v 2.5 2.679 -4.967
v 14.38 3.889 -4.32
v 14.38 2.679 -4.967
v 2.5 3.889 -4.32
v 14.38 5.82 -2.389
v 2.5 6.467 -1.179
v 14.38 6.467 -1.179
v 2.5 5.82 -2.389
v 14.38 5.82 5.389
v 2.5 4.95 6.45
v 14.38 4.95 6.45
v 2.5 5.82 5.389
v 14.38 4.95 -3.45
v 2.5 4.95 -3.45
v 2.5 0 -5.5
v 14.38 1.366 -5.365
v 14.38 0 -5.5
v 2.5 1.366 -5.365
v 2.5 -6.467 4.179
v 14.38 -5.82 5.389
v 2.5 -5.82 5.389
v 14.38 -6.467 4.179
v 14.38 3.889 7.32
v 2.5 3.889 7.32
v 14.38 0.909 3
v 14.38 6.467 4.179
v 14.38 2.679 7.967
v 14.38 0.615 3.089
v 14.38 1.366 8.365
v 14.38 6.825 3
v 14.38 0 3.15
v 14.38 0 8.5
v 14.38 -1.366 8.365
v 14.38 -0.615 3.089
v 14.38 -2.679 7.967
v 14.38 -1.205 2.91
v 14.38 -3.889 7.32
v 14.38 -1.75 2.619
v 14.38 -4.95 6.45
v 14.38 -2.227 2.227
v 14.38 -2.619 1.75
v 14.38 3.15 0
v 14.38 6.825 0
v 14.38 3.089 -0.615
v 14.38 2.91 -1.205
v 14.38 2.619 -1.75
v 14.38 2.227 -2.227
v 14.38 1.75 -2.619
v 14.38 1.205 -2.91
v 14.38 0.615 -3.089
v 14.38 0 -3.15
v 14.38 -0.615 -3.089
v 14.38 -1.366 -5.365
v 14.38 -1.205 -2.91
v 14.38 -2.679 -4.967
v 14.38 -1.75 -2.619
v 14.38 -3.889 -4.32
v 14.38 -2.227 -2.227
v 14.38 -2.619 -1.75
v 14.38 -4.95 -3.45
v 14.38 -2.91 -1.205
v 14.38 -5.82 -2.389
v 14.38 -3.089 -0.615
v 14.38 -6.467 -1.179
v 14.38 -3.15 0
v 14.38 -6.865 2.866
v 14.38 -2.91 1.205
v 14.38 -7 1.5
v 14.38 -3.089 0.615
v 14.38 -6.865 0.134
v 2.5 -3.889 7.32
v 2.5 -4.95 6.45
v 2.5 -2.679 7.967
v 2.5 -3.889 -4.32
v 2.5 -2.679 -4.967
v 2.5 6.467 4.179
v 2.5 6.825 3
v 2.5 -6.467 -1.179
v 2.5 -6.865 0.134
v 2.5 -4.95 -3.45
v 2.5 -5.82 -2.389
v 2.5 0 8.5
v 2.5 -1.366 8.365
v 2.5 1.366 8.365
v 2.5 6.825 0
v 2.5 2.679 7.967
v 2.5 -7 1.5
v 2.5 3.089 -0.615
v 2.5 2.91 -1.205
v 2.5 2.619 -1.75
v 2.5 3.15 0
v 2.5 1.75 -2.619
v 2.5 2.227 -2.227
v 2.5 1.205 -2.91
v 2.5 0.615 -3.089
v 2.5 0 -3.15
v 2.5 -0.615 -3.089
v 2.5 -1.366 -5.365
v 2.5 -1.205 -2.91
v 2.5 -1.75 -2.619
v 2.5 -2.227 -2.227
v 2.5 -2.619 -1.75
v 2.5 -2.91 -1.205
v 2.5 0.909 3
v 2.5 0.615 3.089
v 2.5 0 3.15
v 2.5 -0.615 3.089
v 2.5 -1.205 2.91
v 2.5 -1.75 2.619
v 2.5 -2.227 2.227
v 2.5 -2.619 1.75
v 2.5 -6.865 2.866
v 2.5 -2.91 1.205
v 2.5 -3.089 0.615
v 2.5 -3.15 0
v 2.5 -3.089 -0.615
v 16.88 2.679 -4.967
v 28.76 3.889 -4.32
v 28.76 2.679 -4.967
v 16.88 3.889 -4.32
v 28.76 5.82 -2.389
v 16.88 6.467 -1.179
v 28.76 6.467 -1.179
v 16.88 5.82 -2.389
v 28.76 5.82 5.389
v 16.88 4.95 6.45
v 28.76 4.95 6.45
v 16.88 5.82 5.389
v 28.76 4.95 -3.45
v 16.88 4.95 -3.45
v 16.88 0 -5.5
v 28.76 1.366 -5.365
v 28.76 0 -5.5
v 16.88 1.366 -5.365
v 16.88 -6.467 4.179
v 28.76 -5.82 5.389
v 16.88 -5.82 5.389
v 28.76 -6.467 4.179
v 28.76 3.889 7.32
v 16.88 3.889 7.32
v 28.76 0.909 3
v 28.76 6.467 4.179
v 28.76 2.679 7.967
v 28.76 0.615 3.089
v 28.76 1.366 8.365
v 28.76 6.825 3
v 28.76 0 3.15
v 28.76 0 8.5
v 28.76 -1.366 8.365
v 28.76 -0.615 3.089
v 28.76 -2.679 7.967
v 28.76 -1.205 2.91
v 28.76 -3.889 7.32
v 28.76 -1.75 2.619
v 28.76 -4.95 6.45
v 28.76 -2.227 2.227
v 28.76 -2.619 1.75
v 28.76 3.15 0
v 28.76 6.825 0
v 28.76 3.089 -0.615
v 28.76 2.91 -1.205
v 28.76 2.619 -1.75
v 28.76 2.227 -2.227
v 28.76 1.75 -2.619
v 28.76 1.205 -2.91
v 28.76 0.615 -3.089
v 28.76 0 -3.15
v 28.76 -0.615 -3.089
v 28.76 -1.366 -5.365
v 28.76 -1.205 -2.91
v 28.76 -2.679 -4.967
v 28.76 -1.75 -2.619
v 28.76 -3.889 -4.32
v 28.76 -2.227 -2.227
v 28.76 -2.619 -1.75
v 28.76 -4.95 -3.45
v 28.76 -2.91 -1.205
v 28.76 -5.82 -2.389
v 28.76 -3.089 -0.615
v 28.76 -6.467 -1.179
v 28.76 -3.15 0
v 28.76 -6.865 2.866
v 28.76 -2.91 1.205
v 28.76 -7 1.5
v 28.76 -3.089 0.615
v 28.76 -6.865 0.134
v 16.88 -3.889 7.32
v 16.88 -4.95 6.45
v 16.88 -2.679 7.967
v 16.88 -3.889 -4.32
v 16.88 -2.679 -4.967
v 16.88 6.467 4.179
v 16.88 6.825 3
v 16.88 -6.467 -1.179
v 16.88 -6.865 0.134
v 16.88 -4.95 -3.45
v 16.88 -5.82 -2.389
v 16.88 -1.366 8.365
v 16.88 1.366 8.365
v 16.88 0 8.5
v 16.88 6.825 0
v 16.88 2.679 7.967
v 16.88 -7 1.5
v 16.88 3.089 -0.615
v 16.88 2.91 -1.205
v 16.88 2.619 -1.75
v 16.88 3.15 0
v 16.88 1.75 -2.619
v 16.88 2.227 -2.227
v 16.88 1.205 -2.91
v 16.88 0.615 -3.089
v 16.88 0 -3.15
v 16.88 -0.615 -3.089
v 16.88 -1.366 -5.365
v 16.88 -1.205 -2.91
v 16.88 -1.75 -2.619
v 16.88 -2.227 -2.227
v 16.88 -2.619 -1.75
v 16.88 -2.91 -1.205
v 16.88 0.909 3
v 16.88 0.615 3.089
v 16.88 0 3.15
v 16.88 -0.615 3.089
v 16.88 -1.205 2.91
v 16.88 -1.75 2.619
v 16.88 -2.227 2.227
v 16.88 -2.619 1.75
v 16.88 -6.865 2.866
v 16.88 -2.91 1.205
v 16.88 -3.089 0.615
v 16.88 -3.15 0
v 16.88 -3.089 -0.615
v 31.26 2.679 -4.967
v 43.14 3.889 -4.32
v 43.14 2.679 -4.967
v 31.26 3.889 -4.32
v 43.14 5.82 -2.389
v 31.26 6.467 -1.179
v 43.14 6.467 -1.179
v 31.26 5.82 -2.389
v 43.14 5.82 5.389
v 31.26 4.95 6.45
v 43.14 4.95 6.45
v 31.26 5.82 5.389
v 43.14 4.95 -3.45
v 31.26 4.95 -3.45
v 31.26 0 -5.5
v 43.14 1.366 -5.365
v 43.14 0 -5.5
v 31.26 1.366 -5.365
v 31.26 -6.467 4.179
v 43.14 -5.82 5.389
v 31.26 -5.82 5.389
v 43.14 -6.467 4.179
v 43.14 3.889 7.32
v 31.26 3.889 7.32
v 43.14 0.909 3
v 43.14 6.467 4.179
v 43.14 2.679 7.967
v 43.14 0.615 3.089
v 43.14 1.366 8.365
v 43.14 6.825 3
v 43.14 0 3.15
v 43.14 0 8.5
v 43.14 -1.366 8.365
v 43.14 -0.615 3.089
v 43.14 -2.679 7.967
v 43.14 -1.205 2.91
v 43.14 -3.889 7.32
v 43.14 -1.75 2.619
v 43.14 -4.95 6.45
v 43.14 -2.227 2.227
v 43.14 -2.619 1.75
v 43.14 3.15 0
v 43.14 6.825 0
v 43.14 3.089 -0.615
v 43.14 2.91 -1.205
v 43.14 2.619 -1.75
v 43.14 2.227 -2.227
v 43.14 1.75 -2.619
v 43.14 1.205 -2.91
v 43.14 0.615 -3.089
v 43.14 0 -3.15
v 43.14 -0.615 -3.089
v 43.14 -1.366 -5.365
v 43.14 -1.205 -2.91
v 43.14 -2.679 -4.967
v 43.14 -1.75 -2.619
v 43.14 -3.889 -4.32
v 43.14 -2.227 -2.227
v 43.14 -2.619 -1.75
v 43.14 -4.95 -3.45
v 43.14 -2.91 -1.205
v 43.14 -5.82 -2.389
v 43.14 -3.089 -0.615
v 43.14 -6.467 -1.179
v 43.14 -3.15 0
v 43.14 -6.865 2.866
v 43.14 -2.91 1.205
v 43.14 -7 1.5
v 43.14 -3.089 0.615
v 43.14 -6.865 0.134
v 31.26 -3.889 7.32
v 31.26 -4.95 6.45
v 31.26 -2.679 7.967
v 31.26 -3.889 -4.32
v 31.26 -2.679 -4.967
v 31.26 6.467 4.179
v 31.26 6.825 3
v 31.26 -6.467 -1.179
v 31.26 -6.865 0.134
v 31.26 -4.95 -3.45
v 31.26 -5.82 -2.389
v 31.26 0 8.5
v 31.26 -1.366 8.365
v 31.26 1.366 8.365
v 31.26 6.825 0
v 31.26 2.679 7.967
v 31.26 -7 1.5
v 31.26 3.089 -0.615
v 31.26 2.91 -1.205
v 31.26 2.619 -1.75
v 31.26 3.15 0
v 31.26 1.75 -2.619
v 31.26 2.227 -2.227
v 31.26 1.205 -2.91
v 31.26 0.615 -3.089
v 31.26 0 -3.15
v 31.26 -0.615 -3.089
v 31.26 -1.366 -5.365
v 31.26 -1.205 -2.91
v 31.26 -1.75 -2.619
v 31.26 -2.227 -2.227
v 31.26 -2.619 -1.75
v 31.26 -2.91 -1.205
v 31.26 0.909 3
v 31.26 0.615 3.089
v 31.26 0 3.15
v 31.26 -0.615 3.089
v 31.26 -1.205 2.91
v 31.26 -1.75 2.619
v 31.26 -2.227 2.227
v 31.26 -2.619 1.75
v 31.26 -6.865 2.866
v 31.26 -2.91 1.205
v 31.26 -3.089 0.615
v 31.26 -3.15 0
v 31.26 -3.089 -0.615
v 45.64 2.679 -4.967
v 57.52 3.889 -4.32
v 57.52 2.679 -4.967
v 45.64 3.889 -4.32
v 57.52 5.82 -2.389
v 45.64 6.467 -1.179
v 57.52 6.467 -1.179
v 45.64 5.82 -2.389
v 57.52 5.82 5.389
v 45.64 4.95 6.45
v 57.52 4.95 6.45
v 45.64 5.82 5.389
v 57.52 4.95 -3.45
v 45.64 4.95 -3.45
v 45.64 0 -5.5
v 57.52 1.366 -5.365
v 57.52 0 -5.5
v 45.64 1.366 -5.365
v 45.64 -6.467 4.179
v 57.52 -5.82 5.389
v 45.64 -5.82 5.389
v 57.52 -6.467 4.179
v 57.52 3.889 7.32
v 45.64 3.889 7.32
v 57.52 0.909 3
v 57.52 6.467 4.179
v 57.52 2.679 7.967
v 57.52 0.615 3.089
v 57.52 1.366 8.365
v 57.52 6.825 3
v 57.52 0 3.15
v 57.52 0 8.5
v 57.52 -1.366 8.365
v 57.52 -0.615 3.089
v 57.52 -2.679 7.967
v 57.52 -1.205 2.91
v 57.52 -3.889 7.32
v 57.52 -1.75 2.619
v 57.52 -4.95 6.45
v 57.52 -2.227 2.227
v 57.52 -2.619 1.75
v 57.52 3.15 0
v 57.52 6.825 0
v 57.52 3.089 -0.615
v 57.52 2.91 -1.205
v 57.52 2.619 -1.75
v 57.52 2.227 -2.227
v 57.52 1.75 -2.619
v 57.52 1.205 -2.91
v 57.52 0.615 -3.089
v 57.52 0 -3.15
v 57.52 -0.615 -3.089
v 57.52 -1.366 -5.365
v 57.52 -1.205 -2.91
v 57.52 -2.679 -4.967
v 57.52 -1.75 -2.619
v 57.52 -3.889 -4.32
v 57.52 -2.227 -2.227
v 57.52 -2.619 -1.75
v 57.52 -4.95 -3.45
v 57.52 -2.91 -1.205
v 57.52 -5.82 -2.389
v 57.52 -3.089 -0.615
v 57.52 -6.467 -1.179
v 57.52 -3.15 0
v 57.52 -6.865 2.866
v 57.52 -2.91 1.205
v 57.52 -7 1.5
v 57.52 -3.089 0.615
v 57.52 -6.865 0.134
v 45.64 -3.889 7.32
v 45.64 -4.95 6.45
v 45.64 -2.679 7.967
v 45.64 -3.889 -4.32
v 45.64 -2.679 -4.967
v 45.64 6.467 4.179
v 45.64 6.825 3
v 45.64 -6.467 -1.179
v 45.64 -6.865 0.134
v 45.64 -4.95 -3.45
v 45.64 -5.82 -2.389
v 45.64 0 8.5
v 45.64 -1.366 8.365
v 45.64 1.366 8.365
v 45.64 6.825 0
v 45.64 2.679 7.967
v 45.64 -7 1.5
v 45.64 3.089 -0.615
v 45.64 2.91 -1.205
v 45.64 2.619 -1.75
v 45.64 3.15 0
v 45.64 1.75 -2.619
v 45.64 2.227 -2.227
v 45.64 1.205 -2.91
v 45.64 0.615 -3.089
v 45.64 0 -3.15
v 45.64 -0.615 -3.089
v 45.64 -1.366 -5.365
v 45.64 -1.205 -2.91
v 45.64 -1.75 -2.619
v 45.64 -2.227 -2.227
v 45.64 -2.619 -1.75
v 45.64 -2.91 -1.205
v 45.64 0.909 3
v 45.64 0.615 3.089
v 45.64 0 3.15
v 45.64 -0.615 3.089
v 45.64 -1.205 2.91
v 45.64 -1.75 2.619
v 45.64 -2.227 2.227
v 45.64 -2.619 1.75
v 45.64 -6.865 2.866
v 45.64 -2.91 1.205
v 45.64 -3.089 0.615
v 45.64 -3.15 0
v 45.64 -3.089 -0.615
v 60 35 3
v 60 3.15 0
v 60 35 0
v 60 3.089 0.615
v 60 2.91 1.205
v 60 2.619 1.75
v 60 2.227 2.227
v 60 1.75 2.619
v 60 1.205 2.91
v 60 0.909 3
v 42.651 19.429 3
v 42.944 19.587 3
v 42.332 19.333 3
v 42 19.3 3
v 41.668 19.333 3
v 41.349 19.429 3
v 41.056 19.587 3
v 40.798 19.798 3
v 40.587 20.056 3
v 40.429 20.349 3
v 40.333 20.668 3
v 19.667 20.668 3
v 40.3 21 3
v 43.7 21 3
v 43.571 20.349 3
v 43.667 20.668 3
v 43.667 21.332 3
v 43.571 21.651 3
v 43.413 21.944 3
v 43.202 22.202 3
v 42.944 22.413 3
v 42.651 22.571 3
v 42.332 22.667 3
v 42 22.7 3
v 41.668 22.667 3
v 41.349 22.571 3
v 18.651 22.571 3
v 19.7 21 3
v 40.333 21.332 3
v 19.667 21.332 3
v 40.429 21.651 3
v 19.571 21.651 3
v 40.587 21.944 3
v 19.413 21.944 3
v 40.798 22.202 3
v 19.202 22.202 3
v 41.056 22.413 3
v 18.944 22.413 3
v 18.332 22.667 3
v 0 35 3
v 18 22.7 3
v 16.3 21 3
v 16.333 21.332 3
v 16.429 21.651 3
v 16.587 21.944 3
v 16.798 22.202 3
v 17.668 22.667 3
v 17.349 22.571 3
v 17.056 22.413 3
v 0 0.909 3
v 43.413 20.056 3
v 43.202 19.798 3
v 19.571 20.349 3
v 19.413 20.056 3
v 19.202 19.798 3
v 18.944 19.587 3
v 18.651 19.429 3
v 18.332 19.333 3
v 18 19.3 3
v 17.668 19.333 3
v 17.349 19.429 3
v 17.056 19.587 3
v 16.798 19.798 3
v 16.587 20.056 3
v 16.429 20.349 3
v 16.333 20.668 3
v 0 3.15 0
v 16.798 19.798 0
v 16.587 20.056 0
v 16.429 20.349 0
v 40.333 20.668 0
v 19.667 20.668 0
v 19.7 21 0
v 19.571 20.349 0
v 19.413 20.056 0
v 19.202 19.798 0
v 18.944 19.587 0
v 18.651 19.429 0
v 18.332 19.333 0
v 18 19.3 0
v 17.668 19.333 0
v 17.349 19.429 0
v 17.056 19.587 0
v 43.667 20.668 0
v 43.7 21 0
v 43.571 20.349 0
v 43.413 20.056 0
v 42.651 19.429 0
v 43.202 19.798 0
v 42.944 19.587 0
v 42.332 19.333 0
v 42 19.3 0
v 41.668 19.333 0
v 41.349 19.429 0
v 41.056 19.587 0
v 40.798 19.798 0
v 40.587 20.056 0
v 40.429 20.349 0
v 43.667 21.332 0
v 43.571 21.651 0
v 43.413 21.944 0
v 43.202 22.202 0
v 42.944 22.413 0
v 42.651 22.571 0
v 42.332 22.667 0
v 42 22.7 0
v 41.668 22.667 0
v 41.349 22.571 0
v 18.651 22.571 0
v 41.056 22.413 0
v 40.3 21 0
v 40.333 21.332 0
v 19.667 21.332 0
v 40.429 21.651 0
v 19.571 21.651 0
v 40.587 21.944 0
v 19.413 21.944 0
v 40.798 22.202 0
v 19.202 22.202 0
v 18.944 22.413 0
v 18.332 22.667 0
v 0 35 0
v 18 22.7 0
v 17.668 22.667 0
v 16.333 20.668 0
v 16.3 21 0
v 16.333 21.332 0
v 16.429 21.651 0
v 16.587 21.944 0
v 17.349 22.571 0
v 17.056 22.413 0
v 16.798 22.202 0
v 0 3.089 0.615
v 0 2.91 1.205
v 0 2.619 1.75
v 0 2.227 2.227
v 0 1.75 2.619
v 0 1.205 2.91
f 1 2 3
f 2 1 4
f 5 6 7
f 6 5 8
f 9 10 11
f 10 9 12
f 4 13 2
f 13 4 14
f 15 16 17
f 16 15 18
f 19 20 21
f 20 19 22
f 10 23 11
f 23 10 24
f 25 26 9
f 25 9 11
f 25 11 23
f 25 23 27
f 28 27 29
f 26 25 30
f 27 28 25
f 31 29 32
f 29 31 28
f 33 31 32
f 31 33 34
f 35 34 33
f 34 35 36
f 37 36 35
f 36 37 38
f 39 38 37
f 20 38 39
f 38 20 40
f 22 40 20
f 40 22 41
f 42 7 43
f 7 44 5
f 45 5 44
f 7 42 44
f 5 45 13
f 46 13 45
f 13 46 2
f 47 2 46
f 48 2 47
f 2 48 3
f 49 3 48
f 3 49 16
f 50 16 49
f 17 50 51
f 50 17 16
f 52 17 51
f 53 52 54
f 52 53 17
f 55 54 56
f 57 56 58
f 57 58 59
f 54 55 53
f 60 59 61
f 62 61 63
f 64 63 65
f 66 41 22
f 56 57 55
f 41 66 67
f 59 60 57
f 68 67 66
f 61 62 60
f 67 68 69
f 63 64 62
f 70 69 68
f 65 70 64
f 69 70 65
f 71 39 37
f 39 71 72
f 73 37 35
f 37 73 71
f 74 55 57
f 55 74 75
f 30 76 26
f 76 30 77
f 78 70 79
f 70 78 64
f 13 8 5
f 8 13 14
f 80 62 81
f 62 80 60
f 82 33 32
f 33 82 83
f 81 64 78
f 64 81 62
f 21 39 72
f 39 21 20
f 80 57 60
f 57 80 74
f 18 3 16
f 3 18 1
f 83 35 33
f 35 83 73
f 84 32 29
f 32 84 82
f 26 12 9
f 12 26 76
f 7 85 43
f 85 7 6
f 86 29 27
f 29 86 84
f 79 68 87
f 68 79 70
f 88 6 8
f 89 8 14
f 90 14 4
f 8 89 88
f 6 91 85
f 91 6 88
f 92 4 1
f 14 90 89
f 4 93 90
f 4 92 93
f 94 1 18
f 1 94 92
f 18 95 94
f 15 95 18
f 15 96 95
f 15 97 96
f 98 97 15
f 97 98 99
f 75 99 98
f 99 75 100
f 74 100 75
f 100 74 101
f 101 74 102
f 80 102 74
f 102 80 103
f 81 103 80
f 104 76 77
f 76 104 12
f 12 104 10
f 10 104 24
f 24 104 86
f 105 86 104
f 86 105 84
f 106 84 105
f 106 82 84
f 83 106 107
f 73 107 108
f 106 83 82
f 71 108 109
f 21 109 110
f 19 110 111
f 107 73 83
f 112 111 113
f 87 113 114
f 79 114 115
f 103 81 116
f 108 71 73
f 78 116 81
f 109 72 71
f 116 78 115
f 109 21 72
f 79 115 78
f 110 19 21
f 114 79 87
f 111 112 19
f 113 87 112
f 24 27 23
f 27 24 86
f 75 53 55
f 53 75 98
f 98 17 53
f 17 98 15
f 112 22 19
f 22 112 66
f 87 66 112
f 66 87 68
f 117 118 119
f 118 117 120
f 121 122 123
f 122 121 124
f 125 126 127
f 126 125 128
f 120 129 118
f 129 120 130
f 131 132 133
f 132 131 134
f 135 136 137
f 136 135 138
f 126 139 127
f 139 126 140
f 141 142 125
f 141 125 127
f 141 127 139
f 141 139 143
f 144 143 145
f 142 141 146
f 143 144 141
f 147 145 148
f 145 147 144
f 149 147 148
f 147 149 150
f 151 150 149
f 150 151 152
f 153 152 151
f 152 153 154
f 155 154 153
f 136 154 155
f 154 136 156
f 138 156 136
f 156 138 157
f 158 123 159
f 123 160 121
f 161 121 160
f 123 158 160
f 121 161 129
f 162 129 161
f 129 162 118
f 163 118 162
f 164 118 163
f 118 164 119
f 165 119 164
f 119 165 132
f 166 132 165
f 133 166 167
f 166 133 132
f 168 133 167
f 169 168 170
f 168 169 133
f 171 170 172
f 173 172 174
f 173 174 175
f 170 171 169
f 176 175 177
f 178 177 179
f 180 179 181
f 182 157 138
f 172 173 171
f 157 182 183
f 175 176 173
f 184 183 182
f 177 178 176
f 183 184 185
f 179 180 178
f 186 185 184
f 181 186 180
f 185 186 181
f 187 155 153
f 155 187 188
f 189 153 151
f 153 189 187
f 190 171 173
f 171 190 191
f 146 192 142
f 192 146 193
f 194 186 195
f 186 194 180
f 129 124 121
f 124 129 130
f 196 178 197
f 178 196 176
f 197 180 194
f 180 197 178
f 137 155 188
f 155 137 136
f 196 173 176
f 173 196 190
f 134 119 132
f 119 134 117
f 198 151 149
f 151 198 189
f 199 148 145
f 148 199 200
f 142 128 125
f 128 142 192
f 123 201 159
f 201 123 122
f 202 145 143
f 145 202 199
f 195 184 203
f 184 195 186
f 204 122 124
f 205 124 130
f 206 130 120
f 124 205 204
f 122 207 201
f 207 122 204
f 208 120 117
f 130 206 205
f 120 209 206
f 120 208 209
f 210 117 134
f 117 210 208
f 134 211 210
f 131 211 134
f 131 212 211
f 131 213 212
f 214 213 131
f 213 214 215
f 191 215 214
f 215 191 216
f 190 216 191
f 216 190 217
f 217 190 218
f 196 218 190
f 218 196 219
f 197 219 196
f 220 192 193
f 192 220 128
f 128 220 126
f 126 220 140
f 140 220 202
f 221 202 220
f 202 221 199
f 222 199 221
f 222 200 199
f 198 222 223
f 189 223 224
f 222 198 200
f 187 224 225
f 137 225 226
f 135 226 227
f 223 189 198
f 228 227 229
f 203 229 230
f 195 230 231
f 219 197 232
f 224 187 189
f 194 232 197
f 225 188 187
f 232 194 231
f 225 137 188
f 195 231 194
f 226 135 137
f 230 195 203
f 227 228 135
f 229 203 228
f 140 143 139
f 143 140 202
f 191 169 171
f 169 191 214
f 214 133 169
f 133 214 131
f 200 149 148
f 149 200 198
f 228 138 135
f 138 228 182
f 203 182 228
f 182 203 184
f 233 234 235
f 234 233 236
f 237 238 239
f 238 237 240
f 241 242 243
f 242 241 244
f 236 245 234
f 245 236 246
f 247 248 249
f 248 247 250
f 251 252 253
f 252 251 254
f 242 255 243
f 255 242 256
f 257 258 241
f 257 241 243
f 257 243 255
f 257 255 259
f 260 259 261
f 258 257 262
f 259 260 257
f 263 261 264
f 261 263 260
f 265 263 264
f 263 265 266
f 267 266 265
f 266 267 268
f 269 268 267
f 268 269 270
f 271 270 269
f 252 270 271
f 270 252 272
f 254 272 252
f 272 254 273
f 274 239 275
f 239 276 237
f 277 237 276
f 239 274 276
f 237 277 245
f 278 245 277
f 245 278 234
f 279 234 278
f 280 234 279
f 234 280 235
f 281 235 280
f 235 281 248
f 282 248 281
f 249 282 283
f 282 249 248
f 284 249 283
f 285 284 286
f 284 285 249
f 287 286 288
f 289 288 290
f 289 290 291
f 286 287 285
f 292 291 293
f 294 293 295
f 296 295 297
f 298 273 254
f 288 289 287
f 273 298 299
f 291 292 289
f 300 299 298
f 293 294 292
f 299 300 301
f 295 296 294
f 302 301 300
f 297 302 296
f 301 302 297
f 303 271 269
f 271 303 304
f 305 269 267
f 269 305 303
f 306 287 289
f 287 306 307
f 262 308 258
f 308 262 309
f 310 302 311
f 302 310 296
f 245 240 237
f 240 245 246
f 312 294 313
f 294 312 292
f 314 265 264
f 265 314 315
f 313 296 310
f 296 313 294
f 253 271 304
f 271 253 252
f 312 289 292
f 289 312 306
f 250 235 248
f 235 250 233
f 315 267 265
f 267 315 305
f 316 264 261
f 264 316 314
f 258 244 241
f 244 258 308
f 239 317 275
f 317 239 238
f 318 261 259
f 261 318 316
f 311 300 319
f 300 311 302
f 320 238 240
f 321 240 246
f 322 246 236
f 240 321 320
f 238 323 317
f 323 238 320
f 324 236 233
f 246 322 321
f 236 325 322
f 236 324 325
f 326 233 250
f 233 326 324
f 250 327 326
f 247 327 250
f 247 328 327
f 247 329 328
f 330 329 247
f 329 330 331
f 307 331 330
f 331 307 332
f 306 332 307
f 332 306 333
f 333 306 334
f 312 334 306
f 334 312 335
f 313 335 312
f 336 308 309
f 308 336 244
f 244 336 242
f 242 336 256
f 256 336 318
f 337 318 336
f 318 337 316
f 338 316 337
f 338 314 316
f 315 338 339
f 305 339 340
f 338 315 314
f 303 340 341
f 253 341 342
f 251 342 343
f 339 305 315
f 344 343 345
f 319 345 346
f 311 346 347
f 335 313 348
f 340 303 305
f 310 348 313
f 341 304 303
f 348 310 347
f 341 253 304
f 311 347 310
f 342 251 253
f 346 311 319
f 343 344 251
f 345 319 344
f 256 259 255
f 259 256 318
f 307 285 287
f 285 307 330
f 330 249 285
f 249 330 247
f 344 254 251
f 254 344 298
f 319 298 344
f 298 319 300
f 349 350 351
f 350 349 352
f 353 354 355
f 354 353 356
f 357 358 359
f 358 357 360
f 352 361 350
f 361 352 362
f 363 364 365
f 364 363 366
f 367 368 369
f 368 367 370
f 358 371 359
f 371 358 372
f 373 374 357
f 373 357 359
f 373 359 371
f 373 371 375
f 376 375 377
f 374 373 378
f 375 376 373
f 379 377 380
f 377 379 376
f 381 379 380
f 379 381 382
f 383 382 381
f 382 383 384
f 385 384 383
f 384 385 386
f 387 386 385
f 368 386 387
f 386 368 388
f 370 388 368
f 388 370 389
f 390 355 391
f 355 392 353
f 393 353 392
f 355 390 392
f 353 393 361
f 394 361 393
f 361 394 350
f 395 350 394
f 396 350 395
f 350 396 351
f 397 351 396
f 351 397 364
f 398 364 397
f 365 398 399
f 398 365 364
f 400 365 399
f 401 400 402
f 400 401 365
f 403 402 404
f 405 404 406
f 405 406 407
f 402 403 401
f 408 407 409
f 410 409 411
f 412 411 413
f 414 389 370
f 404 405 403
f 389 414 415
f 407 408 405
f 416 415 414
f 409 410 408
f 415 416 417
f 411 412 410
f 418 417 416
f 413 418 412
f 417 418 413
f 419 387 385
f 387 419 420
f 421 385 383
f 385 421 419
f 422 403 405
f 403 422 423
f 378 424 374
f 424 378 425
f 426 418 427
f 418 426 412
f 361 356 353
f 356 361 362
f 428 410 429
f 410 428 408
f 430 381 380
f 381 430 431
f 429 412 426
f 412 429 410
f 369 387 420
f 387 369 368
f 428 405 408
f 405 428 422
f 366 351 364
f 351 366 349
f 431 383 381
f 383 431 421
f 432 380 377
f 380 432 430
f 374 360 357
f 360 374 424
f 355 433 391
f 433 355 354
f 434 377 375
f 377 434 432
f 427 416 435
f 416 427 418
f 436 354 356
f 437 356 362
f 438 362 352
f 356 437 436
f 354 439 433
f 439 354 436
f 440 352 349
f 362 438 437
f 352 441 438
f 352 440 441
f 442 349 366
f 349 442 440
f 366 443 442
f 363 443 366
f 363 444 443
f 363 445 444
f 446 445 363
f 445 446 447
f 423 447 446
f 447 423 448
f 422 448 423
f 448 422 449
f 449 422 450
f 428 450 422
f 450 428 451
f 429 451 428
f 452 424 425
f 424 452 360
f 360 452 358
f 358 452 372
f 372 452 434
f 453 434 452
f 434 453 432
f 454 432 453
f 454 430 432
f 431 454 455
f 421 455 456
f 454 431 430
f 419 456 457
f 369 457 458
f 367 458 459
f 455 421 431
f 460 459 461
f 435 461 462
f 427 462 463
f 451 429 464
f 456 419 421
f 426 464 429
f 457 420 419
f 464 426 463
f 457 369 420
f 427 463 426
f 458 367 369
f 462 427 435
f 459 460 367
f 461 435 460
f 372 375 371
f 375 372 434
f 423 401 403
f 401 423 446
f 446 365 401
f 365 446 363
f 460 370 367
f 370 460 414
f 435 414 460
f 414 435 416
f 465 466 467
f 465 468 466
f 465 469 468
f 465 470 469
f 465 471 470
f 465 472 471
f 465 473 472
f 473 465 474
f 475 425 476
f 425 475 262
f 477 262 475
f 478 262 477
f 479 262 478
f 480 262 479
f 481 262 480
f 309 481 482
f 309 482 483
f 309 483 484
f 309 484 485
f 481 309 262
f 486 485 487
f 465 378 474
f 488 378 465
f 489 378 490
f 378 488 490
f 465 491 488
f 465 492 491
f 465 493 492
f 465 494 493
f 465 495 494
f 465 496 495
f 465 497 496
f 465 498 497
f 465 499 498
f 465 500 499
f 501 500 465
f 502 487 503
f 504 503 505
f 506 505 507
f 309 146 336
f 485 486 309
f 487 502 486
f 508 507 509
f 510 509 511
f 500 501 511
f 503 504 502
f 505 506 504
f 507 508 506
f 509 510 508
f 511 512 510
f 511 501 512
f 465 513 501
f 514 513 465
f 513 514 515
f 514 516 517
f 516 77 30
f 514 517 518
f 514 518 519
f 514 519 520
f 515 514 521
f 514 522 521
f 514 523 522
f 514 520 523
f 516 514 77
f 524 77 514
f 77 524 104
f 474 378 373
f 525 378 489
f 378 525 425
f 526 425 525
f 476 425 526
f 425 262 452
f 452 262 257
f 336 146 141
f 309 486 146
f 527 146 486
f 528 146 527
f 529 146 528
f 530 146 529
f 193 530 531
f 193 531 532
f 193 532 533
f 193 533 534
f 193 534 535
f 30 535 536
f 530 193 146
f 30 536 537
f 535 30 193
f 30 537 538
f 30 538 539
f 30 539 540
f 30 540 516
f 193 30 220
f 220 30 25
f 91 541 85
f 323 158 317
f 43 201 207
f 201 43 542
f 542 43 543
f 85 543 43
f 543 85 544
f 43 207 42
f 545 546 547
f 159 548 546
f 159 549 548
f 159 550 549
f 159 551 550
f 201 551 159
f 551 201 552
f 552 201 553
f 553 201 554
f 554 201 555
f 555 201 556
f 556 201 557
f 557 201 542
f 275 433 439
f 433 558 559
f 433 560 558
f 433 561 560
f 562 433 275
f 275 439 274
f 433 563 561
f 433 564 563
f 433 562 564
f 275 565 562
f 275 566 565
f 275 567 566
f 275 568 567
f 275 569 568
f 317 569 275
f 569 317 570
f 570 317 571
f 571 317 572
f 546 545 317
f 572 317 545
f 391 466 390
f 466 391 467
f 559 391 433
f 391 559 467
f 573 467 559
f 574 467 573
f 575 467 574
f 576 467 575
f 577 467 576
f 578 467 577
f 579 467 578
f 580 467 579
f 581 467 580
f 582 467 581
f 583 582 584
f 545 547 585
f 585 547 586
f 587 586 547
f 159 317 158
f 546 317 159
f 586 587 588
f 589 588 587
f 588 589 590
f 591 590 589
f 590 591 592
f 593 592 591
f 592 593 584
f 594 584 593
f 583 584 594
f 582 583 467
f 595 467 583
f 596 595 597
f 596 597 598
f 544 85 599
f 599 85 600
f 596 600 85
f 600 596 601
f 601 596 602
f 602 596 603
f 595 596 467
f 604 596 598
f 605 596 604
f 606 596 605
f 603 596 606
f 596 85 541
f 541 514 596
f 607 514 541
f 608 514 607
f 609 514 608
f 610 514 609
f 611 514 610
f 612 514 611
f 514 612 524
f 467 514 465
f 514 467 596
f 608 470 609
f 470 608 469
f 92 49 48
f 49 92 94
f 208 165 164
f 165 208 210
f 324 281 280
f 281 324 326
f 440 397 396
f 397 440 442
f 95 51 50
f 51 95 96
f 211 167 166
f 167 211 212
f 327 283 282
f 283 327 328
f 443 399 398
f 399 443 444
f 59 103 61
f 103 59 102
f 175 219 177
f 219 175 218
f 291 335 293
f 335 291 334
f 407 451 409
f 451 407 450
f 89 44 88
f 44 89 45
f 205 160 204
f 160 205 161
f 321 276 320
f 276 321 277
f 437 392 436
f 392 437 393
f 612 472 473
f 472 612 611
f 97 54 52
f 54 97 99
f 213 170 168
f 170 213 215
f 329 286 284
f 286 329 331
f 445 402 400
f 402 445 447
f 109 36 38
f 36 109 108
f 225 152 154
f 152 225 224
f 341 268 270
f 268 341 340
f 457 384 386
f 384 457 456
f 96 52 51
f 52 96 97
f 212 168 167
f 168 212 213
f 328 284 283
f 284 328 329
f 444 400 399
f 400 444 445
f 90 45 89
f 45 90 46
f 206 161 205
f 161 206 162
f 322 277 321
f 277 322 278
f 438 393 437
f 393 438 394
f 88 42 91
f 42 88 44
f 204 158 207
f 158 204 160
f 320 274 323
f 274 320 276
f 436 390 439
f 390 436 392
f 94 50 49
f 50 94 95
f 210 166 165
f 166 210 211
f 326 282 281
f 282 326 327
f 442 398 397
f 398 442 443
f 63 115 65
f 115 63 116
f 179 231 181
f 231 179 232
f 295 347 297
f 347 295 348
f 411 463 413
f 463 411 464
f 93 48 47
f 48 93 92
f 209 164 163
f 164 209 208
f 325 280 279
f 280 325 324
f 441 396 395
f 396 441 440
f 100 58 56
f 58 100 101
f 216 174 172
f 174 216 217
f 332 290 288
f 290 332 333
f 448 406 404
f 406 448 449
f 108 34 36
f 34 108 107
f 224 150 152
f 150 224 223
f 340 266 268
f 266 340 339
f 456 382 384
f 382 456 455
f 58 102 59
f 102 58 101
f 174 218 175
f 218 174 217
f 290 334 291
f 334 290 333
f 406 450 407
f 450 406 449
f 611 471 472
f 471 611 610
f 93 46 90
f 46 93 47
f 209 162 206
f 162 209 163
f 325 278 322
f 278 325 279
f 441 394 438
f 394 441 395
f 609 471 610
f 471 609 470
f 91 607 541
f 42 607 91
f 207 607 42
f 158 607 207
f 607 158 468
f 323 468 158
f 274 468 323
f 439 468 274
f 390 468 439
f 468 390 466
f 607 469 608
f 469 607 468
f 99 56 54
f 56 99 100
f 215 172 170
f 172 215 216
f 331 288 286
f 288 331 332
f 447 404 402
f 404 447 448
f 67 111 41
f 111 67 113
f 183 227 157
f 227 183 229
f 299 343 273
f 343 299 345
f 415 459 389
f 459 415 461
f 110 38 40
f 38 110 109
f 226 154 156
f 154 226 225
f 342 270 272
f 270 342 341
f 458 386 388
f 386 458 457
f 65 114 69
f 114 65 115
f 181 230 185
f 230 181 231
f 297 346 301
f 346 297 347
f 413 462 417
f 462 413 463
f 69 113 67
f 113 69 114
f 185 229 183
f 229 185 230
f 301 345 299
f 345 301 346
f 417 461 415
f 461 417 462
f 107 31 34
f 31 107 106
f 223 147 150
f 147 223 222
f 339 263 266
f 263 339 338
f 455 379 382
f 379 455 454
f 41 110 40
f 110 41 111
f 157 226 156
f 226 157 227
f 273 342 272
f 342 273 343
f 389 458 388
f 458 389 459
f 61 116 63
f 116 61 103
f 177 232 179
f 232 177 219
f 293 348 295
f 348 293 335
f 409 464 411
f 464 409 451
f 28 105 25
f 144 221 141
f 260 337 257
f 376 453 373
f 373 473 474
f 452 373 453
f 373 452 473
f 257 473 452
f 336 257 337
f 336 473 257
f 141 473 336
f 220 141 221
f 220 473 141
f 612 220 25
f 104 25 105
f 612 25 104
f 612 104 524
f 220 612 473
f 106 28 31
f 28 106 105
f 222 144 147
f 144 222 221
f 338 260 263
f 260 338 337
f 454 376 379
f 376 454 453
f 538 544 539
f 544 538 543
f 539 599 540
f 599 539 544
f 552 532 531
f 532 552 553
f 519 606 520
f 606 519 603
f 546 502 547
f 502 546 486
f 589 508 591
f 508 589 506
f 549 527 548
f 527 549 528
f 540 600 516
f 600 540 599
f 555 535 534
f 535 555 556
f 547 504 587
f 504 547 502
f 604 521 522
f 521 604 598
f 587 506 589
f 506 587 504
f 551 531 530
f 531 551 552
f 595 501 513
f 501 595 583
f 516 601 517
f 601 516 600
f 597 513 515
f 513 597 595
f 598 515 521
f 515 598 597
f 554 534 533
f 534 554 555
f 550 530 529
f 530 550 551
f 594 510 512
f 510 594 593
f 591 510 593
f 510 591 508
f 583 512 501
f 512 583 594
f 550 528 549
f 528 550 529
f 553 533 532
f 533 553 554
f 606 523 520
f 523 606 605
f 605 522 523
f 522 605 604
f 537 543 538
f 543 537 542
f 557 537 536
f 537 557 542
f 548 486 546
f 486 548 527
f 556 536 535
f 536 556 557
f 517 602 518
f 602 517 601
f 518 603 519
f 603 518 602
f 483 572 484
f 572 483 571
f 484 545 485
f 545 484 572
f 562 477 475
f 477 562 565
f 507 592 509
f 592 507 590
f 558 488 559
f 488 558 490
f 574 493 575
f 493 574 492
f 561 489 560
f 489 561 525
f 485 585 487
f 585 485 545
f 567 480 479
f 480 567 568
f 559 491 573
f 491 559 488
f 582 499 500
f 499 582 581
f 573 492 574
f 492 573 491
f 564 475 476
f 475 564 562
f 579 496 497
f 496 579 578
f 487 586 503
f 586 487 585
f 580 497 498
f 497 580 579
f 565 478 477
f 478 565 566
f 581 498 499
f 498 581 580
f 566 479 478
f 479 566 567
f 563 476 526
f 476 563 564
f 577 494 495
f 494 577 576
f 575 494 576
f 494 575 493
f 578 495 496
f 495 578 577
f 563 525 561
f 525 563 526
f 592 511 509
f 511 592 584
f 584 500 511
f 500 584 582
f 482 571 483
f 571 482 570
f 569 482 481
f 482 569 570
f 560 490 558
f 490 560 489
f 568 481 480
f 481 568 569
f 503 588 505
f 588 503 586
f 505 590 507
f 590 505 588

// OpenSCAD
$fn = 32;
// ----------------------------------------------------------------------
// Hinge leaf: 60 x 42 x 14 mm
// ----------------------------------------------------------------------

// --- parameters (mm) ---
tab_len = 60;             // leaf length, X
tab_w = 35;               // leaf width, Y
tab_t = 3;                // leaf thickness
ring_d = 14;              // knuckle diameter
ring_w = 11.88;           // knuckle width
knuckle_n = 4;            // number of knuckles
pin_d = 6.3;              // pin bore
gap = 2.5;                // gap between the knuckles
screw_d = 3.4;            // screw clearance

module leaf() {
  cube([tab_len, tab_w, tab_t]);
}

module knuckles() {
  /* barrels sit on the leaf edge, the pin axis at half the leaf thickness */
  for (i = [0 : knuckle_n - 1])
    translate([gap + i * (ring_w + gap), 0, tab_t * 0.5])
      rotate([0, 90, 0]) cylinder(h = ring_w, d = ring_d);
}

difference() {
  union() {
    leaf();
    knuckles();
  }
  rotate([0, 90, 0]) translate([0, 0, -1])
    cylinder(h = tab_len + 2, d = pin_d);
  translate([18, tab_w * 0.6, -1]) cylinder(h = tab_t + 2, d = screw_d);
  translate([42, tab_w * 0.6, -1]) cylinder(h = tab_t + 2, d = screw_d);
}
